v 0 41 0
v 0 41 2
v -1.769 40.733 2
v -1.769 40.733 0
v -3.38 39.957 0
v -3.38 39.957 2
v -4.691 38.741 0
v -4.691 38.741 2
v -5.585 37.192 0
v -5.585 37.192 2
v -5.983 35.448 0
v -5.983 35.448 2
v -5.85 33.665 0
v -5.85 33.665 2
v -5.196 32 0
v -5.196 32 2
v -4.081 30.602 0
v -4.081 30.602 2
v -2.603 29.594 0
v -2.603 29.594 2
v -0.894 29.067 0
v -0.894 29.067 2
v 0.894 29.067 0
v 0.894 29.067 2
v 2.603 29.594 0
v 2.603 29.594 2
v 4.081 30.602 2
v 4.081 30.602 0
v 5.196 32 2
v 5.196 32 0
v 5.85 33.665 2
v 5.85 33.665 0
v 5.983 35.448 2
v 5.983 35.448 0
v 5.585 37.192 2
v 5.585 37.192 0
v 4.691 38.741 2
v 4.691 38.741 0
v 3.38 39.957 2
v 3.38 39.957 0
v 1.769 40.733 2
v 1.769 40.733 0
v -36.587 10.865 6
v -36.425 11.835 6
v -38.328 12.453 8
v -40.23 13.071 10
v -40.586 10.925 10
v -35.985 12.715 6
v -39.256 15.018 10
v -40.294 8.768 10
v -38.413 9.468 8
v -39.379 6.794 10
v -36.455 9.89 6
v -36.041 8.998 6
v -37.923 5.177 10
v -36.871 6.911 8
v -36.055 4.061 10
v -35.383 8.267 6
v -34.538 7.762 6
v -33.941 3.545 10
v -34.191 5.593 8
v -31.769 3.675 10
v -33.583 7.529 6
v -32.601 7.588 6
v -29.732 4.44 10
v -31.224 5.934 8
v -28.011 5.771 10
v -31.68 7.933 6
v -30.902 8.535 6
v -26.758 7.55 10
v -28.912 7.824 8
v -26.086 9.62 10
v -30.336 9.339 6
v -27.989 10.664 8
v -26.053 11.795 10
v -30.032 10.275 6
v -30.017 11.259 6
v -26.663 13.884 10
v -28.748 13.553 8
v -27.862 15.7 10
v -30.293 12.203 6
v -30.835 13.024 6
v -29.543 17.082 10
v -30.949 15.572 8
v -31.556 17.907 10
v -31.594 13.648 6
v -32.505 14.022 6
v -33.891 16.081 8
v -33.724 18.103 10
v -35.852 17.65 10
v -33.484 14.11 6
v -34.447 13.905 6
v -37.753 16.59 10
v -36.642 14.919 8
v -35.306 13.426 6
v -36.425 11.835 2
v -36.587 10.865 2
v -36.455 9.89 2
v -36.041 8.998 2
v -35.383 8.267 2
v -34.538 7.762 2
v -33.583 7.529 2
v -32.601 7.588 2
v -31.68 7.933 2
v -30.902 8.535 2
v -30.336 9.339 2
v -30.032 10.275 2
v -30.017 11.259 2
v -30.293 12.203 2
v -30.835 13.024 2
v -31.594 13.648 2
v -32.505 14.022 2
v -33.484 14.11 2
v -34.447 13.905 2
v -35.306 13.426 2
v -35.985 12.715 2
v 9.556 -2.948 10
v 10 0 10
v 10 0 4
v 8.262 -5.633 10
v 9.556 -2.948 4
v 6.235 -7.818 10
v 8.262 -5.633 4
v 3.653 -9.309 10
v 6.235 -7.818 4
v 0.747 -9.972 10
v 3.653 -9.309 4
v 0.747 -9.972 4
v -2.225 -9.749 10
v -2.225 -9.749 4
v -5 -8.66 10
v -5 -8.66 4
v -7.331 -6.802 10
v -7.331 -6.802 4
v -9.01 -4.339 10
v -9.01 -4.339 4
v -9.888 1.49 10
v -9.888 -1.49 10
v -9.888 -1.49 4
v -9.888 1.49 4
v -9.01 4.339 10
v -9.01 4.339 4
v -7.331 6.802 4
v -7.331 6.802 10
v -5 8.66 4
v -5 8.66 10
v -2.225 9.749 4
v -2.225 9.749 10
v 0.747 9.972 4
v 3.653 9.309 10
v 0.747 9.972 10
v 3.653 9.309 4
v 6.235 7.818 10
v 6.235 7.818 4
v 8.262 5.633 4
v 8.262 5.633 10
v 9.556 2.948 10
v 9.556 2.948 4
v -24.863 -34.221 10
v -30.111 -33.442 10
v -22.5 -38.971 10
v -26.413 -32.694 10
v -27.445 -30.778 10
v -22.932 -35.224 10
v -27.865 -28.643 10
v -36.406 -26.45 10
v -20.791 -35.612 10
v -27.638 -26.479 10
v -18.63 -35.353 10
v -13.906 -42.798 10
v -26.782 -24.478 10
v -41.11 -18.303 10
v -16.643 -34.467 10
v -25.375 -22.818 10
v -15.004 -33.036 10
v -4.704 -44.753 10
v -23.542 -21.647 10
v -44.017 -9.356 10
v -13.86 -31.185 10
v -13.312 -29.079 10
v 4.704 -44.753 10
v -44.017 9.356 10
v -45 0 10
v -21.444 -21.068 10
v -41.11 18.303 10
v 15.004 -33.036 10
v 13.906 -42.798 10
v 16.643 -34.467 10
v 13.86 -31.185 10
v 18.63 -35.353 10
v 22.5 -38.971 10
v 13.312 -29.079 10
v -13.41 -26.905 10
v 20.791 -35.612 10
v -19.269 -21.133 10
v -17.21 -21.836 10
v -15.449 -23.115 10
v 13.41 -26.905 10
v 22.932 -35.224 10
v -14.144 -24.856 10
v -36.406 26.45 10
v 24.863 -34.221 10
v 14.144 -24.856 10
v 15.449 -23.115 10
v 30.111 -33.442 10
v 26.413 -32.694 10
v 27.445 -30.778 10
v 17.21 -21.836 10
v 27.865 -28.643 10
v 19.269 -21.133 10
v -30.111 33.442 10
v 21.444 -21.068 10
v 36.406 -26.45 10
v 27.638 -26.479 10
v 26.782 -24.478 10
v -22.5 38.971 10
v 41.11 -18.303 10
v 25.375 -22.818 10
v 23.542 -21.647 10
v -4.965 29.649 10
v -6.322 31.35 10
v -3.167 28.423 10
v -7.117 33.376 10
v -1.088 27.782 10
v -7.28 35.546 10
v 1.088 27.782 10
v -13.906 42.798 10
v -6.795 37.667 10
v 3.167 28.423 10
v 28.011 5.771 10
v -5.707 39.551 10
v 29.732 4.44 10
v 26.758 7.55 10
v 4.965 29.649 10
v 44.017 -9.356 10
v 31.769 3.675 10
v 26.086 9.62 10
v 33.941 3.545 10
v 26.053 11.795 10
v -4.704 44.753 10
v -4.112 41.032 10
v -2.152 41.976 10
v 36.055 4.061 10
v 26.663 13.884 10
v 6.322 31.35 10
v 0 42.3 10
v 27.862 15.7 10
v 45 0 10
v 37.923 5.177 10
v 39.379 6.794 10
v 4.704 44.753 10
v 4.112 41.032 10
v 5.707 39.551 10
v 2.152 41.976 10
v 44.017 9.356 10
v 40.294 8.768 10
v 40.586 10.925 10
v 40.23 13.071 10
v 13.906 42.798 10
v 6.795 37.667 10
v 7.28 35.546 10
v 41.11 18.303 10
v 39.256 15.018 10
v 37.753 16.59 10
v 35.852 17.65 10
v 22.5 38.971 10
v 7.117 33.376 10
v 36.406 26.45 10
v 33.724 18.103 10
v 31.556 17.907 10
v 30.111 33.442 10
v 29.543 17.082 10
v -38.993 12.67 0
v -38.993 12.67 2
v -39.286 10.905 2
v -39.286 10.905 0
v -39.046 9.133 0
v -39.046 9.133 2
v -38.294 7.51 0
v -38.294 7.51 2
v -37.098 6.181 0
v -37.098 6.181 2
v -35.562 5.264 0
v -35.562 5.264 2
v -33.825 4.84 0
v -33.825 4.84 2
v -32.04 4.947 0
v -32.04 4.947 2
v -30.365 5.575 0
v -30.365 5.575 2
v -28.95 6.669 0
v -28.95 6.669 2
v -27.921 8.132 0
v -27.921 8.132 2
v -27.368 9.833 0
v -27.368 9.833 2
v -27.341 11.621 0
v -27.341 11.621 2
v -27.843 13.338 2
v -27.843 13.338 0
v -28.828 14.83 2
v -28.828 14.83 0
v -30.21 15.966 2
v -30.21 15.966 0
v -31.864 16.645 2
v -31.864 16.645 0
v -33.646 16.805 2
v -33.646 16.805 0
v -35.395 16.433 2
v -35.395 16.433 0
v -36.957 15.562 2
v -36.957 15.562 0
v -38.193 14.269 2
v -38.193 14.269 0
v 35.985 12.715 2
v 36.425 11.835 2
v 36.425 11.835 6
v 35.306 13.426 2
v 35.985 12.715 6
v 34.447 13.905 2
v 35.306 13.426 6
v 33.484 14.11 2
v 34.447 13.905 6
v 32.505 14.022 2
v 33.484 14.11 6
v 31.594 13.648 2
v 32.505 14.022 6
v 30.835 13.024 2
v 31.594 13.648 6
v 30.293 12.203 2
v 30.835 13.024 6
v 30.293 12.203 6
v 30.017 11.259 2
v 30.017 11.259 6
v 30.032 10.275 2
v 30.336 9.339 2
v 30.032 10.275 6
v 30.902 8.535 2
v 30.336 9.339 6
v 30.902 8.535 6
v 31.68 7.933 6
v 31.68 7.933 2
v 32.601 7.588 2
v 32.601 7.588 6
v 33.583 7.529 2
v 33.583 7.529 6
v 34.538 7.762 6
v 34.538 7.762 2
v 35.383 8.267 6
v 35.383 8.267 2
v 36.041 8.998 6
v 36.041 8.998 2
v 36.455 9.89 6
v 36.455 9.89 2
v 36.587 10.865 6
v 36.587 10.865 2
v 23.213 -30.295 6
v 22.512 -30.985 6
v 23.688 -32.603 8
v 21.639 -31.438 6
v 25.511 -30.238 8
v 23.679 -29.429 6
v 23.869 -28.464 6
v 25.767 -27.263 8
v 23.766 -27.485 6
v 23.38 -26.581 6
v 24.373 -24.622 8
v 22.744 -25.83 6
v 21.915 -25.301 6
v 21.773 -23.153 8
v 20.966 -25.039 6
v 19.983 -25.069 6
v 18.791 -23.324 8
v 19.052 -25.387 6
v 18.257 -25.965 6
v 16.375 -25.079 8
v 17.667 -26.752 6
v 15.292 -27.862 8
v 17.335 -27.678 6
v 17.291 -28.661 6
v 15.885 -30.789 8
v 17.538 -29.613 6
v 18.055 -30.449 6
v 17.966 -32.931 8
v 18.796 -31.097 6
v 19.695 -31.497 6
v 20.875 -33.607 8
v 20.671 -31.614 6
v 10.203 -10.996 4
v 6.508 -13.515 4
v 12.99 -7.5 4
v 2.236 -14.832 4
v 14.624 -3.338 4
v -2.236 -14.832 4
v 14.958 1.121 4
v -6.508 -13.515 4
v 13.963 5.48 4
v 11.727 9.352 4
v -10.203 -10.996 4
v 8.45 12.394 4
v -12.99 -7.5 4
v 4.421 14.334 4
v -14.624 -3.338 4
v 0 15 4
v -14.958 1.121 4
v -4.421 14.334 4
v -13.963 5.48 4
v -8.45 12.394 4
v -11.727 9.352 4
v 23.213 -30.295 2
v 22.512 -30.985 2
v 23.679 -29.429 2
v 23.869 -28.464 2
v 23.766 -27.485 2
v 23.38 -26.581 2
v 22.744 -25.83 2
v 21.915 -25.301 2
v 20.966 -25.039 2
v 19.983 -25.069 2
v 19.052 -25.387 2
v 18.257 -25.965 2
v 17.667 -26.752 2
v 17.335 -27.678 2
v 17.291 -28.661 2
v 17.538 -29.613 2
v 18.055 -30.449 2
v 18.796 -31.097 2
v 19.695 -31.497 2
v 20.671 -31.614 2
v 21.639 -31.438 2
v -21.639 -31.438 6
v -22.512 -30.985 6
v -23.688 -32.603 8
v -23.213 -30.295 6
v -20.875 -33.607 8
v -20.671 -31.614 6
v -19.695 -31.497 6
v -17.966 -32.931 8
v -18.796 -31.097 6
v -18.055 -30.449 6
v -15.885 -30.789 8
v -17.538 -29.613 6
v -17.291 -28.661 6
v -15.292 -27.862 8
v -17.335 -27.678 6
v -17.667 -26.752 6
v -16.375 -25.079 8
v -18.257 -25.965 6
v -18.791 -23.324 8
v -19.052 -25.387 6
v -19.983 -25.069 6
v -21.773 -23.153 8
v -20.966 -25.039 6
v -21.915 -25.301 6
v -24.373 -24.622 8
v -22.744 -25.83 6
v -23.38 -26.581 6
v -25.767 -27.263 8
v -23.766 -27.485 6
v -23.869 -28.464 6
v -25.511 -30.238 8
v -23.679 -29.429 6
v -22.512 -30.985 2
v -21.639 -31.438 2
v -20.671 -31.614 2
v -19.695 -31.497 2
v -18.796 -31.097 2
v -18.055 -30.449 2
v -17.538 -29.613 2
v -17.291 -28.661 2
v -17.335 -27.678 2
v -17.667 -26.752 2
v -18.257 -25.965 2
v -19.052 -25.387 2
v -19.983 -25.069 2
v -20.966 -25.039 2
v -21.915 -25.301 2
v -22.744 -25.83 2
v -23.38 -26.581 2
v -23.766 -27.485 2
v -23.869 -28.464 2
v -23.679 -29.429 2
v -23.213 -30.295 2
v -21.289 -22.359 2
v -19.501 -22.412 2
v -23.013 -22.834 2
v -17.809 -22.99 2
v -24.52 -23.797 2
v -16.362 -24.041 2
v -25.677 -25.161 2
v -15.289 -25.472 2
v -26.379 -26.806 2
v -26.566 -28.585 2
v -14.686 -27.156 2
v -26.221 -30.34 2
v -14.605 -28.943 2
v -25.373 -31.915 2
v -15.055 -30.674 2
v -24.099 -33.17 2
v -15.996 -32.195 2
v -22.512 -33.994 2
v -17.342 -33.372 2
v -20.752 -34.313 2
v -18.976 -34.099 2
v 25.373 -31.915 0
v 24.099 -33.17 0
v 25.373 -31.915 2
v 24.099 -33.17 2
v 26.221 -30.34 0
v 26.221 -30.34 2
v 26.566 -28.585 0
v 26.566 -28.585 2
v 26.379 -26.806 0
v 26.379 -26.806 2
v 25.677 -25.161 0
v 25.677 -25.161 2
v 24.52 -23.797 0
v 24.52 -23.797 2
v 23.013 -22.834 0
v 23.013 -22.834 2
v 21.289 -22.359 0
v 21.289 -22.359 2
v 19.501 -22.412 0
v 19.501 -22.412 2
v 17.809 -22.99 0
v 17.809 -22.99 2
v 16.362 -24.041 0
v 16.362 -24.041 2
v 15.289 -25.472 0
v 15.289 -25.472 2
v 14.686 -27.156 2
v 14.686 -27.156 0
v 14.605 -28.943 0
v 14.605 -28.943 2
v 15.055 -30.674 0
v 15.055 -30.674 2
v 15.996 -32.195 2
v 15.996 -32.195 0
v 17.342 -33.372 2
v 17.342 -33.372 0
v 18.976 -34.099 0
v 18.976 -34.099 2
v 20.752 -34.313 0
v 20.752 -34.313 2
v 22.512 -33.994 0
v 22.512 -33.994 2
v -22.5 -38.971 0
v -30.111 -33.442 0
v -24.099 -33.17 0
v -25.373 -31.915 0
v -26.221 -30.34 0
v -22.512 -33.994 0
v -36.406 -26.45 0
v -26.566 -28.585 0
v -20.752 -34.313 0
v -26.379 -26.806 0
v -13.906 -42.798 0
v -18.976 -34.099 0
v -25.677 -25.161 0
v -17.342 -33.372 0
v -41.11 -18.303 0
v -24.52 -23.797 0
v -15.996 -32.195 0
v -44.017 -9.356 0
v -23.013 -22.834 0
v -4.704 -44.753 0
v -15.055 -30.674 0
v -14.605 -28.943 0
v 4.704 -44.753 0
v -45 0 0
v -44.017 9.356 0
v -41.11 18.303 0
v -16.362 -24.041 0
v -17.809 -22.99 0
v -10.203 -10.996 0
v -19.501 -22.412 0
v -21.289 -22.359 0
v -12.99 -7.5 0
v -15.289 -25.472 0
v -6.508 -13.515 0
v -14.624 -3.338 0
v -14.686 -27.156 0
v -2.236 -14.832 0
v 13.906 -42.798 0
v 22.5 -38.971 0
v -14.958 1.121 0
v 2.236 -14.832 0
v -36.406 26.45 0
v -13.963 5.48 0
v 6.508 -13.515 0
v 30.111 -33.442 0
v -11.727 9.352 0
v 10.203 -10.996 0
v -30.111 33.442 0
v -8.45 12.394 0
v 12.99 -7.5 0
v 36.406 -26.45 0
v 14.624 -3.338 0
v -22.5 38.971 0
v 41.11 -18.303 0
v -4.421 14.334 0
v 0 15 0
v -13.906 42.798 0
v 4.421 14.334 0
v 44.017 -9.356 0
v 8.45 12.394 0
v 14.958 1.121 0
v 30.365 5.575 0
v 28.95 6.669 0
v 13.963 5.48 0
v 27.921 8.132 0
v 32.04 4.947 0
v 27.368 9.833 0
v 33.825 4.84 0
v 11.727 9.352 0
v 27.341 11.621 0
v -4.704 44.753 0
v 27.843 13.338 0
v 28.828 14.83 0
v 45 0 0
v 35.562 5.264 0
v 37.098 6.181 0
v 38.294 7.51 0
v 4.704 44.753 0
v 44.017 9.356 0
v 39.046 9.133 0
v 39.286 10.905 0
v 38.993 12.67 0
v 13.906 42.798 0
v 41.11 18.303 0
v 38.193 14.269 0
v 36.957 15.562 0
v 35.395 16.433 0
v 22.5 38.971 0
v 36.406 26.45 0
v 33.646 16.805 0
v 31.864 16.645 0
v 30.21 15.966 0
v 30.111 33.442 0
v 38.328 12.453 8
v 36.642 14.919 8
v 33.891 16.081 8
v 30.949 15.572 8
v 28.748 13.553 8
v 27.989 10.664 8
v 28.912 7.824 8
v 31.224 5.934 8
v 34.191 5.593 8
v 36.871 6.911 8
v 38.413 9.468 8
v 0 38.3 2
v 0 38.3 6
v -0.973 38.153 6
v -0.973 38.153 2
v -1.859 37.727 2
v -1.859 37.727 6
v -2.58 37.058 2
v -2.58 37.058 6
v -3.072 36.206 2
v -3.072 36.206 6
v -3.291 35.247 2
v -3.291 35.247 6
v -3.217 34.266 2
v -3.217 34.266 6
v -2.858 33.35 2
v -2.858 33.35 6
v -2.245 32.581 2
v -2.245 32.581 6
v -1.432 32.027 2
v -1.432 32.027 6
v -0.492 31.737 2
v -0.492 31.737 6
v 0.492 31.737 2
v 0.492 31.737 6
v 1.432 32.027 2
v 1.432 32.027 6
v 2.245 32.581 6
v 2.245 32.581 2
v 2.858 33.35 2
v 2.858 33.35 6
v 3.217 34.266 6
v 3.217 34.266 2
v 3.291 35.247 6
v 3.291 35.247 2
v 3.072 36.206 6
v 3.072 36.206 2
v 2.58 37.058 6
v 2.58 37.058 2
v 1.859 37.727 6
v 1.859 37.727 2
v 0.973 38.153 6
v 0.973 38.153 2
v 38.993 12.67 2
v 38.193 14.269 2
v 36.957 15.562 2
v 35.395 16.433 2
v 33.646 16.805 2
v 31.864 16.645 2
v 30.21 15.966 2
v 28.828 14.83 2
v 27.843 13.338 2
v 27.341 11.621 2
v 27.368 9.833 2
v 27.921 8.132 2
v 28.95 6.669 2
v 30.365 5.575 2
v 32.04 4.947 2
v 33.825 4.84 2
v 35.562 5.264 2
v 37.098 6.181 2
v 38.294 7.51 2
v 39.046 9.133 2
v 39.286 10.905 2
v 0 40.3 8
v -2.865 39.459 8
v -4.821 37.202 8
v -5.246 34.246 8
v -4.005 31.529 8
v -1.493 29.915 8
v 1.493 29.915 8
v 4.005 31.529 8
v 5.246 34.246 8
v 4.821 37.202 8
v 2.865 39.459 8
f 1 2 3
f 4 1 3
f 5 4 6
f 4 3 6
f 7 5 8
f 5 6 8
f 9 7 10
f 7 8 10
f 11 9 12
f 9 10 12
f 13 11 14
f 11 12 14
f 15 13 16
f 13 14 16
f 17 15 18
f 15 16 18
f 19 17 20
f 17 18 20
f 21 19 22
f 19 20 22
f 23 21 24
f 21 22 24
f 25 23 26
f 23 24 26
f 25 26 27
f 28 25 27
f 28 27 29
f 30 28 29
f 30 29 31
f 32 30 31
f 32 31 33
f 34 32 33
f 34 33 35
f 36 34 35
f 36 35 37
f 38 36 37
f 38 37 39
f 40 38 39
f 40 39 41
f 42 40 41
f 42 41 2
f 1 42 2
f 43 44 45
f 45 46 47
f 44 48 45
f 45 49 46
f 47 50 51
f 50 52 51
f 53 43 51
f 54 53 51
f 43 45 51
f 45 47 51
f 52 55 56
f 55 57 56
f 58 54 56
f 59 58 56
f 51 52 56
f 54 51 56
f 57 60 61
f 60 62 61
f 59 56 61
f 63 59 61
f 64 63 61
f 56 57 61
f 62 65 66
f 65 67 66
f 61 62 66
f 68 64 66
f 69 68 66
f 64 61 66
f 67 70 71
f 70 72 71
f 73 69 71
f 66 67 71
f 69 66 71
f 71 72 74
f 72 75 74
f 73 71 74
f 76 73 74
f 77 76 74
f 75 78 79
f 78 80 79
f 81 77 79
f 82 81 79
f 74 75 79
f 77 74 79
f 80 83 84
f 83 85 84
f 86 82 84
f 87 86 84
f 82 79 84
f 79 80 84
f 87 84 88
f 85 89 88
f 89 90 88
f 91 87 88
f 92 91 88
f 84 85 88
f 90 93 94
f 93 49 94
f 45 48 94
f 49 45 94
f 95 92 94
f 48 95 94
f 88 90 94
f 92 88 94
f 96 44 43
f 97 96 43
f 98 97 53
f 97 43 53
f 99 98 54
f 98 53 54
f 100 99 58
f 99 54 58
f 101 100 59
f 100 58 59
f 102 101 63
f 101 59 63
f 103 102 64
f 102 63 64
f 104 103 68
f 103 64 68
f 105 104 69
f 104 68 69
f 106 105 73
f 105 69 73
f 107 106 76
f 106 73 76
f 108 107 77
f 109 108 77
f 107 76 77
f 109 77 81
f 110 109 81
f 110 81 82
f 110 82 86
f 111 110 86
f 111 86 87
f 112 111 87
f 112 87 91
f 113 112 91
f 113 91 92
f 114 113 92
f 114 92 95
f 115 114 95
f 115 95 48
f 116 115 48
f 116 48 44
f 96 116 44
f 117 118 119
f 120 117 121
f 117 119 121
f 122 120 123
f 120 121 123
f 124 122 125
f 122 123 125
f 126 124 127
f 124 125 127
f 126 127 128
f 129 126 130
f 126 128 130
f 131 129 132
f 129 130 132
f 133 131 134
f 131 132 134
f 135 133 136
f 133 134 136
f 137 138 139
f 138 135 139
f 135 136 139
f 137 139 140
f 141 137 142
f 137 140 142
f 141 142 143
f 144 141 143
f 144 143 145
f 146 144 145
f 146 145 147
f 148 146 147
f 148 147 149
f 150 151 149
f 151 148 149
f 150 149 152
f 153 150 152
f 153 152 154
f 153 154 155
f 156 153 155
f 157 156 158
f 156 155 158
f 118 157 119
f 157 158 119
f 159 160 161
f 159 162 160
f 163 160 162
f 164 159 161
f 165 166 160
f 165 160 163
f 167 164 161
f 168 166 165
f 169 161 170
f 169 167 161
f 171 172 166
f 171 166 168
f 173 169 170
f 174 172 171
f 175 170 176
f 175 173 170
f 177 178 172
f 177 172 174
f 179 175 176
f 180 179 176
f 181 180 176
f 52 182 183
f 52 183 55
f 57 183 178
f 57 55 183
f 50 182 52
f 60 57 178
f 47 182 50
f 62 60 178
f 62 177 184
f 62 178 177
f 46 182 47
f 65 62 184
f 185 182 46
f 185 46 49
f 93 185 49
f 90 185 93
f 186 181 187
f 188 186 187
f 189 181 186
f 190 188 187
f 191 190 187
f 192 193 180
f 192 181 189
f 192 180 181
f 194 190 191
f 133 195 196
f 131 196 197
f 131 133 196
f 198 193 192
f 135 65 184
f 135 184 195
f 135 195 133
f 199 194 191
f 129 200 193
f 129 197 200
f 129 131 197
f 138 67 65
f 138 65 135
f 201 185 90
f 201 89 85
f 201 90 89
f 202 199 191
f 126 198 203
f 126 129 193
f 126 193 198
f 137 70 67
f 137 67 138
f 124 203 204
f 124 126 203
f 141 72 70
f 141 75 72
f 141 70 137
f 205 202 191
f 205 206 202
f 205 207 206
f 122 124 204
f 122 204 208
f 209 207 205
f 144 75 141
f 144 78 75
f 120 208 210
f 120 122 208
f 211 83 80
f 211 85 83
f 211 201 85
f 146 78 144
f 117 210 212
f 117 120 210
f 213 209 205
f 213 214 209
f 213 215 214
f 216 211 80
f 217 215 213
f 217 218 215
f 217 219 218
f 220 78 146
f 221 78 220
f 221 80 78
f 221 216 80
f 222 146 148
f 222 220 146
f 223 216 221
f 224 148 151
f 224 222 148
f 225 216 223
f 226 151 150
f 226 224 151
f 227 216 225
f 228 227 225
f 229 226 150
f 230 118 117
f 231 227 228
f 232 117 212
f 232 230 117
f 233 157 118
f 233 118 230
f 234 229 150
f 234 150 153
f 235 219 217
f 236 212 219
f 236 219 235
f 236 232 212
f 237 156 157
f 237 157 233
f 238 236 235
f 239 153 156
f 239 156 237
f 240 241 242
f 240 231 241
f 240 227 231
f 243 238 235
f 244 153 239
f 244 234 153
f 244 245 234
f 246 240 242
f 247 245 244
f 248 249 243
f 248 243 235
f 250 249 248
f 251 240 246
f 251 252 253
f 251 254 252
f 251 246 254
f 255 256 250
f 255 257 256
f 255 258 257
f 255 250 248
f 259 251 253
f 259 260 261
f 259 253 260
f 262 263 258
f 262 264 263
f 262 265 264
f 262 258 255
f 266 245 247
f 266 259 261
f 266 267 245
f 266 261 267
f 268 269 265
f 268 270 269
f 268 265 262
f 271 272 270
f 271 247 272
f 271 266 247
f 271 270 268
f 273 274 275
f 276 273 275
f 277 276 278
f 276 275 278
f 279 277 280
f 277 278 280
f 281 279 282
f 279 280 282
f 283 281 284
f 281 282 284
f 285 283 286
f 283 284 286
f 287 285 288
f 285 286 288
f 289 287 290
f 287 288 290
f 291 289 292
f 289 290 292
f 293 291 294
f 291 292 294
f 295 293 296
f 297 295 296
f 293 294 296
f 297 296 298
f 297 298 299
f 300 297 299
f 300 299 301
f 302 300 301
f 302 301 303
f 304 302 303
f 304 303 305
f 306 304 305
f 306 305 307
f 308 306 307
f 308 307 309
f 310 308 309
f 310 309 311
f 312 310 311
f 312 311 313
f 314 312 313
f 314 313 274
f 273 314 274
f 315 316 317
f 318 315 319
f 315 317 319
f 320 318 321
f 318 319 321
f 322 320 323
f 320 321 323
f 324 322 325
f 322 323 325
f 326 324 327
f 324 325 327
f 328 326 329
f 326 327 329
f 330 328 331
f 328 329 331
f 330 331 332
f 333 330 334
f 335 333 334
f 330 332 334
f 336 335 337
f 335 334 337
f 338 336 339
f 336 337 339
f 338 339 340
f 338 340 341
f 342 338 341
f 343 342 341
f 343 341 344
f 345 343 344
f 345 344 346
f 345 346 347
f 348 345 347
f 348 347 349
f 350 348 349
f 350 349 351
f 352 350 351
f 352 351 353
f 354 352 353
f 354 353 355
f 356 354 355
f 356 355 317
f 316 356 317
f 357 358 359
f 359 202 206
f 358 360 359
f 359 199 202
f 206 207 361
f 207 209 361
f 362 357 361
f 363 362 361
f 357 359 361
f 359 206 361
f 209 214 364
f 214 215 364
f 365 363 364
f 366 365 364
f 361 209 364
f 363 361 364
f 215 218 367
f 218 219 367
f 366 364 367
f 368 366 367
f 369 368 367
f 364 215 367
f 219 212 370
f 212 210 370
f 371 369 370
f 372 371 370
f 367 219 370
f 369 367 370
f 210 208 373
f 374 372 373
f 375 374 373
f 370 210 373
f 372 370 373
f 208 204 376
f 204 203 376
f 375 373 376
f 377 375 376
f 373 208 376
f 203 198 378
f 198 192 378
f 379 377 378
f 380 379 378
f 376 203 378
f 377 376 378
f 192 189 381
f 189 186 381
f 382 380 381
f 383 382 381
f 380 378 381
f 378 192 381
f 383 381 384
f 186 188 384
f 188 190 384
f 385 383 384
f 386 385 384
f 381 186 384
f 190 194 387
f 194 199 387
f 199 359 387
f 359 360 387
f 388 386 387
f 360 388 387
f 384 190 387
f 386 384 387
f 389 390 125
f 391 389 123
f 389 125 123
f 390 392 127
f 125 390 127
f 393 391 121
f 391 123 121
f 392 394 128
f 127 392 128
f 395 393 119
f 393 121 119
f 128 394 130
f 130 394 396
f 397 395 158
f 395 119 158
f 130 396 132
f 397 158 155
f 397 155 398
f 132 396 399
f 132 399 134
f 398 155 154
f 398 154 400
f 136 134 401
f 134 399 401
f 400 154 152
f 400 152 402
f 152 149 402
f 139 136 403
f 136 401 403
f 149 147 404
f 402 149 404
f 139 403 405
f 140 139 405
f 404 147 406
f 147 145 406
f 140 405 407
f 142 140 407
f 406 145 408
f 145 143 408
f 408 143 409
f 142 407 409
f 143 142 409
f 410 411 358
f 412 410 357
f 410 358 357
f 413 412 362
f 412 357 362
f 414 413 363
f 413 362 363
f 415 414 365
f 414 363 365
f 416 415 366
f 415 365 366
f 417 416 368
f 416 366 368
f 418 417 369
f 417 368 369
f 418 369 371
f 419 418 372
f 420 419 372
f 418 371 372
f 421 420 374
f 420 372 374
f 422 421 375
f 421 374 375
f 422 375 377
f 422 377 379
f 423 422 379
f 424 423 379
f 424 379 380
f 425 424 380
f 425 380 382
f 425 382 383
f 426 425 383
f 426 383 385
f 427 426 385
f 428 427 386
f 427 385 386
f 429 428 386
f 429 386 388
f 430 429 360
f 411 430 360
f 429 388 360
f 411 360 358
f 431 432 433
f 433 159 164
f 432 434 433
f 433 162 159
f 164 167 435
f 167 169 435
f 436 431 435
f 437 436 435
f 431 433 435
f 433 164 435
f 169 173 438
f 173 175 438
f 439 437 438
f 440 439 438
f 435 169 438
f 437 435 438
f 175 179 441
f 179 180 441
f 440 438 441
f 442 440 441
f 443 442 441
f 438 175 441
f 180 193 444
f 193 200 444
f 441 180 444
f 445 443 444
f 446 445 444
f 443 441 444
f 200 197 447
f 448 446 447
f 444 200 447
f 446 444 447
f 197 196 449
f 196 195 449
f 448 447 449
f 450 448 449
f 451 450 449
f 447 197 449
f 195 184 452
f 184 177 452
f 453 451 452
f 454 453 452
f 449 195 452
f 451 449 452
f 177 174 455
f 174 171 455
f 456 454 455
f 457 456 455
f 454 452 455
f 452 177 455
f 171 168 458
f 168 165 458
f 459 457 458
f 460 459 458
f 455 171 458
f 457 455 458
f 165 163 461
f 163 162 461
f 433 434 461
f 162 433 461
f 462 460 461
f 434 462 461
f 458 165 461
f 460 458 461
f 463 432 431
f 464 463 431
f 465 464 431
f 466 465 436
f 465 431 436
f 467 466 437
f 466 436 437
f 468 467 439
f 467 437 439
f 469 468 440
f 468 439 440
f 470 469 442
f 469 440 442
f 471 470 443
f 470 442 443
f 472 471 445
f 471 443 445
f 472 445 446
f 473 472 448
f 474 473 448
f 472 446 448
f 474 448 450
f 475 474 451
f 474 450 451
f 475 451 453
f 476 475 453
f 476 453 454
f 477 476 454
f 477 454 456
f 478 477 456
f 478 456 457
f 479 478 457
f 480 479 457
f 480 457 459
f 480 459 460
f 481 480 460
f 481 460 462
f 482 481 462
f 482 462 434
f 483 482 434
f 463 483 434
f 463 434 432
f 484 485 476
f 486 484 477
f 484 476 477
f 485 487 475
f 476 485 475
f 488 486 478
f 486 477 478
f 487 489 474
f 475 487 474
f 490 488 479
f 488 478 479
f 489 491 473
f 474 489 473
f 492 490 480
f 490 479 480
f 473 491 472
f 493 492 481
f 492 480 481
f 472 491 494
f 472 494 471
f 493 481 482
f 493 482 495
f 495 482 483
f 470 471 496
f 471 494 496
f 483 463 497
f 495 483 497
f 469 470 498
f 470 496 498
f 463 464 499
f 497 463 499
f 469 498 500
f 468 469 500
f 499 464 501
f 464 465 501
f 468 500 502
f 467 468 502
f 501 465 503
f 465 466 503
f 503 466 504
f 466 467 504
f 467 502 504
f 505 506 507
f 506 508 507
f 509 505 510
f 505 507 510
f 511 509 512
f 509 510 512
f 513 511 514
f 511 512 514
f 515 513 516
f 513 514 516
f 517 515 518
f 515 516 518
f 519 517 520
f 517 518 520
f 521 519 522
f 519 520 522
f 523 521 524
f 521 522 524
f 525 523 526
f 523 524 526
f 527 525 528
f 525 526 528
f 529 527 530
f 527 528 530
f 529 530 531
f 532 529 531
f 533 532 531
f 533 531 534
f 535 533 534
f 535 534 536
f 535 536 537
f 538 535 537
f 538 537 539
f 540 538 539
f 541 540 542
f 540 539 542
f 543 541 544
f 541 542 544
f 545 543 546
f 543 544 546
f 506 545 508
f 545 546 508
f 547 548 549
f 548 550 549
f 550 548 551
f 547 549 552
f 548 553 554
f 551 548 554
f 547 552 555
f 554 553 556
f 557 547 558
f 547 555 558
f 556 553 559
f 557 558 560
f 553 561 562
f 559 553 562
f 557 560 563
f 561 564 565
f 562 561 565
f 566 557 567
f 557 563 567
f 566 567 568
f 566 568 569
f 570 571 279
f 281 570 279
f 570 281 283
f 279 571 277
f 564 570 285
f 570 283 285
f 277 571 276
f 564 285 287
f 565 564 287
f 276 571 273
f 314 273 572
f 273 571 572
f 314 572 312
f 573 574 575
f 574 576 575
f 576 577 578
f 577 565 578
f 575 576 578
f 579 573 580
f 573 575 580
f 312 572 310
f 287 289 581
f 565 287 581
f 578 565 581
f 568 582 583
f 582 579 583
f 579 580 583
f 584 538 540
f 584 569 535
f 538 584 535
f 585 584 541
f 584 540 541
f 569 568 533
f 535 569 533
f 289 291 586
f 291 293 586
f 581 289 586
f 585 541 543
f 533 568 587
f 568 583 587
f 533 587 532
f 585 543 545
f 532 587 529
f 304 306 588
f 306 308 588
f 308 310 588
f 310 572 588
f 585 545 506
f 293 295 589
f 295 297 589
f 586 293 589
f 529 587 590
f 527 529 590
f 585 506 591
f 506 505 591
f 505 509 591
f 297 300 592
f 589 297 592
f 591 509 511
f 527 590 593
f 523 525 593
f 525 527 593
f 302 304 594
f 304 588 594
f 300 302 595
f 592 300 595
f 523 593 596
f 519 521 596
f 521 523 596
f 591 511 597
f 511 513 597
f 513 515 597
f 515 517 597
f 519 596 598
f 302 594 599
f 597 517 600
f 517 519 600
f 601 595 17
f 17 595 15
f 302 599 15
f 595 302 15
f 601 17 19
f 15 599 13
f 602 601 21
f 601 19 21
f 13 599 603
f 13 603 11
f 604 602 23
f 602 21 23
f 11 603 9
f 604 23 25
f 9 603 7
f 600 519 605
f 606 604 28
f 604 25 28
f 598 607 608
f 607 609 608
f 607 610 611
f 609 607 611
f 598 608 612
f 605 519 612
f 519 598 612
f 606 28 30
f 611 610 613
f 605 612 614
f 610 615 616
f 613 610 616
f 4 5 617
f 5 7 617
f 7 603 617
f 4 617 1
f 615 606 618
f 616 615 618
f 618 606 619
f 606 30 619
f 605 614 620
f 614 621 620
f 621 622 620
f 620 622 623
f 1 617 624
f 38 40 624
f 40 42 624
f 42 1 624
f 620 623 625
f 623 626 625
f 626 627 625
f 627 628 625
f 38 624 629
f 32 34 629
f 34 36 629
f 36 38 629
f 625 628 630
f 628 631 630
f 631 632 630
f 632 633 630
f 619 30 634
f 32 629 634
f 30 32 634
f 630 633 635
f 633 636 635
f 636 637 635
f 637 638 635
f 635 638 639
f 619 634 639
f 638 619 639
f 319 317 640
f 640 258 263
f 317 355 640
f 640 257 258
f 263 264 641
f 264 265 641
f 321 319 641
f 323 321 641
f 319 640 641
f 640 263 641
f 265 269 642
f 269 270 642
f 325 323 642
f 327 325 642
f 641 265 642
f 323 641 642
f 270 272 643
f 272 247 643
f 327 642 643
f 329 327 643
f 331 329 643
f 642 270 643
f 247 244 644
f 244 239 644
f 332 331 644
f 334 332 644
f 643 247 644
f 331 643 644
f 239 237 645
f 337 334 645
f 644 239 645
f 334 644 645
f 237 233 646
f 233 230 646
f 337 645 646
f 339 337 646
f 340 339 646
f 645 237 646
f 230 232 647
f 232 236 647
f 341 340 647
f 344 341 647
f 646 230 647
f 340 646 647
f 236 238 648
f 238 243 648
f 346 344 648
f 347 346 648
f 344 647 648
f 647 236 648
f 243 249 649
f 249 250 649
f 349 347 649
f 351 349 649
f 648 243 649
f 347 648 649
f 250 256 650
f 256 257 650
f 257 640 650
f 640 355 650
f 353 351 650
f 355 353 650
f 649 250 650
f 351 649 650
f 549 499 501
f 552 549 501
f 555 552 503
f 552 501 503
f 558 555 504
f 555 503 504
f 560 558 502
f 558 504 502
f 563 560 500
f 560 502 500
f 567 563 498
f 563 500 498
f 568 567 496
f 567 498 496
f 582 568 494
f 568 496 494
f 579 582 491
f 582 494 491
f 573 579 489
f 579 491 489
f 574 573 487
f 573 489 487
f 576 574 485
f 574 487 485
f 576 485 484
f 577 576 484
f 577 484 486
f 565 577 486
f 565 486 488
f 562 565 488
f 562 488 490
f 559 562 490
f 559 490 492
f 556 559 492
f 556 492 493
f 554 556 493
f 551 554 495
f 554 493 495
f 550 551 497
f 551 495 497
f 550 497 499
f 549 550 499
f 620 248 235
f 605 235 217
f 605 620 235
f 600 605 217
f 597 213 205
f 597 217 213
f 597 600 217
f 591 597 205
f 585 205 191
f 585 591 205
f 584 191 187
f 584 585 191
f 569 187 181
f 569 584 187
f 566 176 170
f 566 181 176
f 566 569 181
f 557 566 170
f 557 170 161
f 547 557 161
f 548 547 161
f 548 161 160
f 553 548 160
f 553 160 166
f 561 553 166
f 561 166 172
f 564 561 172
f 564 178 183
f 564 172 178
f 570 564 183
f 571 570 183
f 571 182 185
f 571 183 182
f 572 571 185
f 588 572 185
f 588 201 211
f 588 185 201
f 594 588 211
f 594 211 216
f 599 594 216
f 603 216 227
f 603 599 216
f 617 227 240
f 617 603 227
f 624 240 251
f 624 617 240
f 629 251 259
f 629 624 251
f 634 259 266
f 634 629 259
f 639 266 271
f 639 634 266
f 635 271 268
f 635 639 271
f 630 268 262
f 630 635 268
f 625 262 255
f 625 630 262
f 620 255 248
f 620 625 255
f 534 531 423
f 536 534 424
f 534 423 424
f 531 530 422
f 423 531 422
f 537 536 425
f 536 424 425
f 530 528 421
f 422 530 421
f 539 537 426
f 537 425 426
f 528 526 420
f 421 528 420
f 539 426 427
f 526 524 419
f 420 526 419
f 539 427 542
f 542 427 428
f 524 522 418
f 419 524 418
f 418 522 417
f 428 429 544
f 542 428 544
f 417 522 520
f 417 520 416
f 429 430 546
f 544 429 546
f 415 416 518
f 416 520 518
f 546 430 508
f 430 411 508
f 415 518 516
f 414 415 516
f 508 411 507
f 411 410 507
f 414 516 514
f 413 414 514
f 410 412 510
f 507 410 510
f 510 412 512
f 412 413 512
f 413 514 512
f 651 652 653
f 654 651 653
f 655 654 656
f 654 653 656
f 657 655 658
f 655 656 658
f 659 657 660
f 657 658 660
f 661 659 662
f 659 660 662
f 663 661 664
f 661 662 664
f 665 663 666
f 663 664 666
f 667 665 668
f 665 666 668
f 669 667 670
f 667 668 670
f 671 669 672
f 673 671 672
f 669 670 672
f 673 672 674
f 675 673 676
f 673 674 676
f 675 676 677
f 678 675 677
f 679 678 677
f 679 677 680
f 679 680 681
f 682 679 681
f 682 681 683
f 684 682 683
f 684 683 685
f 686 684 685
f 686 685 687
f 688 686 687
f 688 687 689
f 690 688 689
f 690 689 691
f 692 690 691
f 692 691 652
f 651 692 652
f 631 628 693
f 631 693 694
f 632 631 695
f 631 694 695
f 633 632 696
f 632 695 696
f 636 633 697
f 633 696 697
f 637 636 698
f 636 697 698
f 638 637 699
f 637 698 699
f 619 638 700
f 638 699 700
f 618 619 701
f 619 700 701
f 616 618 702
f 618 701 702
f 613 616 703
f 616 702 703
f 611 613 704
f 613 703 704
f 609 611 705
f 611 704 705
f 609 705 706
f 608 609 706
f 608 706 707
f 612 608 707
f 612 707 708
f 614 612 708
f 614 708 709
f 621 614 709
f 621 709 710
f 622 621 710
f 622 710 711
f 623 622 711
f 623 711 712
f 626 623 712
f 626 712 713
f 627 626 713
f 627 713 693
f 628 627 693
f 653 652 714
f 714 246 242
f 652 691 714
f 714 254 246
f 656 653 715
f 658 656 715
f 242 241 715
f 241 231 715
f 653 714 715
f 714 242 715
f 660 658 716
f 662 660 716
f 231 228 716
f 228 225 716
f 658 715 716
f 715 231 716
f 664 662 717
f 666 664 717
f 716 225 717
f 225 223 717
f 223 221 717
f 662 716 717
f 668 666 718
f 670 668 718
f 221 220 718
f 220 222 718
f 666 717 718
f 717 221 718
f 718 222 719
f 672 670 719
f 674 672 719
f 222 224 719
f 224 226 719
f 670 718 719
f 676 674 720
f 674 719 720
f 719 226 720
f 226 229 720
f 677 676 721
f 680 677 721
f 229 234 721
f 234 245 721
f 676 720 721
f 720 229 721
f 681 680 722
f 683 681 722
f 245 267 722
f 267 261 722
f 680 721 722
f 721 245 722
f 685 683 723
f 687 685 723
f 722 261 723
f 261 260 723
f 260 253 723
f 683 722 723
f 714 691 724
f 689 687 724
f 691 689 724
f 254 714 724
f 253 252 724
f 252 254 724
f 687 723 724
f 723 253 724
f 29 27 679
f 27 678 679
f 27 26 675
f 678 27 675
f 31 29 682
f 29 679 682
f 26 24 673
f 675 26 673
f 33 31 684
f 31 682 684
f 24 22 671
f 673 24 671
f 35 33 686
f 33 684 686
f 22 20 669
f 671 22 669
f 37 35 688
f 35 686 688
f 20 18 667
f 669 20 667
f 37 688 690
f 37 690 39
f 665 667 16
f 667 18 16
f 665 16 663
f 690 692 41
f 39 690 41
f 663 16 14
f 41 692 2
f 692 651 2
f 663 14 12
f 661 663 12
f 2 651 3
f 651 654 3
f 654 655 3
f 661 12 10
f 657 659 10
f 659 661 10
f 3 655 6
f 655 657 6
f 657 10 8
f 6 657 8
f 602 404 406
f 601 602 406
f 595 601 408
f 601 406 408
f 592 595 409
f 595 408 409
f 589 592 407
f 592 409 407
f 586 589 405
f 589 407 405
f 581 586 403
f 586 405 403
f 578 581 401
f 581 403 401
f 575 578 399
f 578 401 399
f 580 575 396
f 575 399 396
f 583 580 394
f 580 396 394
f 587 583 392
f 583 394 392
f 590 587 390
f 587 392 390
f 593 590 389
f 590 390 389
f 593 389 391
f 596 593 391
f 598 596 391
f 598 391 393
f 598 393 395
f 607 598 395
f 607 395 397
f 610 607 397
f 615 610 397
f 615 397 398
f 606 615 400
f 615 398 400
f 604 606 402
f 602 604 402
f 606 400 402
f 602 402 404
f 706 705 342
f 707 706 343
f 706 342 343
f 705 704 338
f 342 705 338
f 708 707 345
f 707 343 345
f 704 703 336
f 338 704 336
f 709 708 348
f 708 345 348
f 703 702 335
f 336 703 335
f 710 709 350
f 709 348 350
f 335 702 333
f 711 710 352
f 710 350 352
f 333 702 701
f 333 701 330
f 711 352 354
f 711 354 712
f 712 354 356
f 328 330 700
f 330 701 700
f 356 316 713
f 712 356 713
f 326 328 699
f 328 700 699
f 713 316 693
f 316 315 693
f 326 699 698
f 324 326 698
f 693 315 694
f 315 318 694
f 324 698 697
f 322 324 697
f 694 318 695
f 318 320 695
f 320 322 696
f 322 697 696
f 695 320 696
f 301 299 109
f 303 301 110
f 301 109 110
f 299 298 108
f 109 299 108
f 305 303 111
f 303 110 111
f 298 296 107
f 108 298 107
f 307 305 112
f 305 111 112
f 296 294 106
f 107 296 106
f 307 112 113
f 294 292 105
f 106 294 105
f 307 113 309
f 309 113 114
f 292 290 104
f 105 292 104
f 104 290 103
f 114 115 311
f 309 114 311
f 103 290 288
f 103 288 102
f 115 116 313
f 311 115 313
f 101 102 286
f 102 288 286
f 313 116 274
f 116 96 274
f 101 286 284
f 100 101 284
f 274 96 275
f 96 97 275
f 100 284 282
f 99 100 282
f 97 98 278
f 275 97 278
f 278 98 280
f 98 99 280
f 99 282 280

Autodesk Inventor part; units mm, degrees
ref_plane "YZ Plane" through (0, 0, 0) normal (1, 0, 0) x (0, 1, 0)
ref_plane "XZ Plane" through (0, 0, 0) normal (0, 1, 0) x (-1, 0, 0)
ref_plane "XY Plane" through (0, 0, 0) normal (0, 0, 1) x (1, 0, 0)
sketch "Sketch1" plane through (0, 0, 0) normal (0, 0, 1) x (1, 0, 0)
  circle A0 centre (0, 0) radius 45
  circle A1 centre (0, 0) radius 10
  dimension "d0" = 90
  dimension "d1" = 20
extrude "Extrusion1" add sketch "Sketch1" along normal blind 10
hole "Hole1" at (0, 0, 0) direction (0, 0, 1) diameter 30 depth 4
sketch "Sketch2" plane through (0, 0, 0) normal (0, 0, -1) x (-1, 0, 0)
  circle A0 centre (0, 35) radius 3.6674
  point P0 (0, 0)
  dimension "d15" = 35
hole "Hole2" at (0, 35, 0) direction (0, 0, 1) diameter 6.6 end through all counterbore diameter 12 counterbore depth 2
chamfer "Chamfer1" distance 4 angle 45 1 edges at (0, 31.7, 10)
pattern_circular "Circular Pattern1" count 5 over 360 about axis through (0, 0, 0) along (0, 0, 1) of "Hole2", "Chamfer1"
properties part number "342-08" material "Titanium"
